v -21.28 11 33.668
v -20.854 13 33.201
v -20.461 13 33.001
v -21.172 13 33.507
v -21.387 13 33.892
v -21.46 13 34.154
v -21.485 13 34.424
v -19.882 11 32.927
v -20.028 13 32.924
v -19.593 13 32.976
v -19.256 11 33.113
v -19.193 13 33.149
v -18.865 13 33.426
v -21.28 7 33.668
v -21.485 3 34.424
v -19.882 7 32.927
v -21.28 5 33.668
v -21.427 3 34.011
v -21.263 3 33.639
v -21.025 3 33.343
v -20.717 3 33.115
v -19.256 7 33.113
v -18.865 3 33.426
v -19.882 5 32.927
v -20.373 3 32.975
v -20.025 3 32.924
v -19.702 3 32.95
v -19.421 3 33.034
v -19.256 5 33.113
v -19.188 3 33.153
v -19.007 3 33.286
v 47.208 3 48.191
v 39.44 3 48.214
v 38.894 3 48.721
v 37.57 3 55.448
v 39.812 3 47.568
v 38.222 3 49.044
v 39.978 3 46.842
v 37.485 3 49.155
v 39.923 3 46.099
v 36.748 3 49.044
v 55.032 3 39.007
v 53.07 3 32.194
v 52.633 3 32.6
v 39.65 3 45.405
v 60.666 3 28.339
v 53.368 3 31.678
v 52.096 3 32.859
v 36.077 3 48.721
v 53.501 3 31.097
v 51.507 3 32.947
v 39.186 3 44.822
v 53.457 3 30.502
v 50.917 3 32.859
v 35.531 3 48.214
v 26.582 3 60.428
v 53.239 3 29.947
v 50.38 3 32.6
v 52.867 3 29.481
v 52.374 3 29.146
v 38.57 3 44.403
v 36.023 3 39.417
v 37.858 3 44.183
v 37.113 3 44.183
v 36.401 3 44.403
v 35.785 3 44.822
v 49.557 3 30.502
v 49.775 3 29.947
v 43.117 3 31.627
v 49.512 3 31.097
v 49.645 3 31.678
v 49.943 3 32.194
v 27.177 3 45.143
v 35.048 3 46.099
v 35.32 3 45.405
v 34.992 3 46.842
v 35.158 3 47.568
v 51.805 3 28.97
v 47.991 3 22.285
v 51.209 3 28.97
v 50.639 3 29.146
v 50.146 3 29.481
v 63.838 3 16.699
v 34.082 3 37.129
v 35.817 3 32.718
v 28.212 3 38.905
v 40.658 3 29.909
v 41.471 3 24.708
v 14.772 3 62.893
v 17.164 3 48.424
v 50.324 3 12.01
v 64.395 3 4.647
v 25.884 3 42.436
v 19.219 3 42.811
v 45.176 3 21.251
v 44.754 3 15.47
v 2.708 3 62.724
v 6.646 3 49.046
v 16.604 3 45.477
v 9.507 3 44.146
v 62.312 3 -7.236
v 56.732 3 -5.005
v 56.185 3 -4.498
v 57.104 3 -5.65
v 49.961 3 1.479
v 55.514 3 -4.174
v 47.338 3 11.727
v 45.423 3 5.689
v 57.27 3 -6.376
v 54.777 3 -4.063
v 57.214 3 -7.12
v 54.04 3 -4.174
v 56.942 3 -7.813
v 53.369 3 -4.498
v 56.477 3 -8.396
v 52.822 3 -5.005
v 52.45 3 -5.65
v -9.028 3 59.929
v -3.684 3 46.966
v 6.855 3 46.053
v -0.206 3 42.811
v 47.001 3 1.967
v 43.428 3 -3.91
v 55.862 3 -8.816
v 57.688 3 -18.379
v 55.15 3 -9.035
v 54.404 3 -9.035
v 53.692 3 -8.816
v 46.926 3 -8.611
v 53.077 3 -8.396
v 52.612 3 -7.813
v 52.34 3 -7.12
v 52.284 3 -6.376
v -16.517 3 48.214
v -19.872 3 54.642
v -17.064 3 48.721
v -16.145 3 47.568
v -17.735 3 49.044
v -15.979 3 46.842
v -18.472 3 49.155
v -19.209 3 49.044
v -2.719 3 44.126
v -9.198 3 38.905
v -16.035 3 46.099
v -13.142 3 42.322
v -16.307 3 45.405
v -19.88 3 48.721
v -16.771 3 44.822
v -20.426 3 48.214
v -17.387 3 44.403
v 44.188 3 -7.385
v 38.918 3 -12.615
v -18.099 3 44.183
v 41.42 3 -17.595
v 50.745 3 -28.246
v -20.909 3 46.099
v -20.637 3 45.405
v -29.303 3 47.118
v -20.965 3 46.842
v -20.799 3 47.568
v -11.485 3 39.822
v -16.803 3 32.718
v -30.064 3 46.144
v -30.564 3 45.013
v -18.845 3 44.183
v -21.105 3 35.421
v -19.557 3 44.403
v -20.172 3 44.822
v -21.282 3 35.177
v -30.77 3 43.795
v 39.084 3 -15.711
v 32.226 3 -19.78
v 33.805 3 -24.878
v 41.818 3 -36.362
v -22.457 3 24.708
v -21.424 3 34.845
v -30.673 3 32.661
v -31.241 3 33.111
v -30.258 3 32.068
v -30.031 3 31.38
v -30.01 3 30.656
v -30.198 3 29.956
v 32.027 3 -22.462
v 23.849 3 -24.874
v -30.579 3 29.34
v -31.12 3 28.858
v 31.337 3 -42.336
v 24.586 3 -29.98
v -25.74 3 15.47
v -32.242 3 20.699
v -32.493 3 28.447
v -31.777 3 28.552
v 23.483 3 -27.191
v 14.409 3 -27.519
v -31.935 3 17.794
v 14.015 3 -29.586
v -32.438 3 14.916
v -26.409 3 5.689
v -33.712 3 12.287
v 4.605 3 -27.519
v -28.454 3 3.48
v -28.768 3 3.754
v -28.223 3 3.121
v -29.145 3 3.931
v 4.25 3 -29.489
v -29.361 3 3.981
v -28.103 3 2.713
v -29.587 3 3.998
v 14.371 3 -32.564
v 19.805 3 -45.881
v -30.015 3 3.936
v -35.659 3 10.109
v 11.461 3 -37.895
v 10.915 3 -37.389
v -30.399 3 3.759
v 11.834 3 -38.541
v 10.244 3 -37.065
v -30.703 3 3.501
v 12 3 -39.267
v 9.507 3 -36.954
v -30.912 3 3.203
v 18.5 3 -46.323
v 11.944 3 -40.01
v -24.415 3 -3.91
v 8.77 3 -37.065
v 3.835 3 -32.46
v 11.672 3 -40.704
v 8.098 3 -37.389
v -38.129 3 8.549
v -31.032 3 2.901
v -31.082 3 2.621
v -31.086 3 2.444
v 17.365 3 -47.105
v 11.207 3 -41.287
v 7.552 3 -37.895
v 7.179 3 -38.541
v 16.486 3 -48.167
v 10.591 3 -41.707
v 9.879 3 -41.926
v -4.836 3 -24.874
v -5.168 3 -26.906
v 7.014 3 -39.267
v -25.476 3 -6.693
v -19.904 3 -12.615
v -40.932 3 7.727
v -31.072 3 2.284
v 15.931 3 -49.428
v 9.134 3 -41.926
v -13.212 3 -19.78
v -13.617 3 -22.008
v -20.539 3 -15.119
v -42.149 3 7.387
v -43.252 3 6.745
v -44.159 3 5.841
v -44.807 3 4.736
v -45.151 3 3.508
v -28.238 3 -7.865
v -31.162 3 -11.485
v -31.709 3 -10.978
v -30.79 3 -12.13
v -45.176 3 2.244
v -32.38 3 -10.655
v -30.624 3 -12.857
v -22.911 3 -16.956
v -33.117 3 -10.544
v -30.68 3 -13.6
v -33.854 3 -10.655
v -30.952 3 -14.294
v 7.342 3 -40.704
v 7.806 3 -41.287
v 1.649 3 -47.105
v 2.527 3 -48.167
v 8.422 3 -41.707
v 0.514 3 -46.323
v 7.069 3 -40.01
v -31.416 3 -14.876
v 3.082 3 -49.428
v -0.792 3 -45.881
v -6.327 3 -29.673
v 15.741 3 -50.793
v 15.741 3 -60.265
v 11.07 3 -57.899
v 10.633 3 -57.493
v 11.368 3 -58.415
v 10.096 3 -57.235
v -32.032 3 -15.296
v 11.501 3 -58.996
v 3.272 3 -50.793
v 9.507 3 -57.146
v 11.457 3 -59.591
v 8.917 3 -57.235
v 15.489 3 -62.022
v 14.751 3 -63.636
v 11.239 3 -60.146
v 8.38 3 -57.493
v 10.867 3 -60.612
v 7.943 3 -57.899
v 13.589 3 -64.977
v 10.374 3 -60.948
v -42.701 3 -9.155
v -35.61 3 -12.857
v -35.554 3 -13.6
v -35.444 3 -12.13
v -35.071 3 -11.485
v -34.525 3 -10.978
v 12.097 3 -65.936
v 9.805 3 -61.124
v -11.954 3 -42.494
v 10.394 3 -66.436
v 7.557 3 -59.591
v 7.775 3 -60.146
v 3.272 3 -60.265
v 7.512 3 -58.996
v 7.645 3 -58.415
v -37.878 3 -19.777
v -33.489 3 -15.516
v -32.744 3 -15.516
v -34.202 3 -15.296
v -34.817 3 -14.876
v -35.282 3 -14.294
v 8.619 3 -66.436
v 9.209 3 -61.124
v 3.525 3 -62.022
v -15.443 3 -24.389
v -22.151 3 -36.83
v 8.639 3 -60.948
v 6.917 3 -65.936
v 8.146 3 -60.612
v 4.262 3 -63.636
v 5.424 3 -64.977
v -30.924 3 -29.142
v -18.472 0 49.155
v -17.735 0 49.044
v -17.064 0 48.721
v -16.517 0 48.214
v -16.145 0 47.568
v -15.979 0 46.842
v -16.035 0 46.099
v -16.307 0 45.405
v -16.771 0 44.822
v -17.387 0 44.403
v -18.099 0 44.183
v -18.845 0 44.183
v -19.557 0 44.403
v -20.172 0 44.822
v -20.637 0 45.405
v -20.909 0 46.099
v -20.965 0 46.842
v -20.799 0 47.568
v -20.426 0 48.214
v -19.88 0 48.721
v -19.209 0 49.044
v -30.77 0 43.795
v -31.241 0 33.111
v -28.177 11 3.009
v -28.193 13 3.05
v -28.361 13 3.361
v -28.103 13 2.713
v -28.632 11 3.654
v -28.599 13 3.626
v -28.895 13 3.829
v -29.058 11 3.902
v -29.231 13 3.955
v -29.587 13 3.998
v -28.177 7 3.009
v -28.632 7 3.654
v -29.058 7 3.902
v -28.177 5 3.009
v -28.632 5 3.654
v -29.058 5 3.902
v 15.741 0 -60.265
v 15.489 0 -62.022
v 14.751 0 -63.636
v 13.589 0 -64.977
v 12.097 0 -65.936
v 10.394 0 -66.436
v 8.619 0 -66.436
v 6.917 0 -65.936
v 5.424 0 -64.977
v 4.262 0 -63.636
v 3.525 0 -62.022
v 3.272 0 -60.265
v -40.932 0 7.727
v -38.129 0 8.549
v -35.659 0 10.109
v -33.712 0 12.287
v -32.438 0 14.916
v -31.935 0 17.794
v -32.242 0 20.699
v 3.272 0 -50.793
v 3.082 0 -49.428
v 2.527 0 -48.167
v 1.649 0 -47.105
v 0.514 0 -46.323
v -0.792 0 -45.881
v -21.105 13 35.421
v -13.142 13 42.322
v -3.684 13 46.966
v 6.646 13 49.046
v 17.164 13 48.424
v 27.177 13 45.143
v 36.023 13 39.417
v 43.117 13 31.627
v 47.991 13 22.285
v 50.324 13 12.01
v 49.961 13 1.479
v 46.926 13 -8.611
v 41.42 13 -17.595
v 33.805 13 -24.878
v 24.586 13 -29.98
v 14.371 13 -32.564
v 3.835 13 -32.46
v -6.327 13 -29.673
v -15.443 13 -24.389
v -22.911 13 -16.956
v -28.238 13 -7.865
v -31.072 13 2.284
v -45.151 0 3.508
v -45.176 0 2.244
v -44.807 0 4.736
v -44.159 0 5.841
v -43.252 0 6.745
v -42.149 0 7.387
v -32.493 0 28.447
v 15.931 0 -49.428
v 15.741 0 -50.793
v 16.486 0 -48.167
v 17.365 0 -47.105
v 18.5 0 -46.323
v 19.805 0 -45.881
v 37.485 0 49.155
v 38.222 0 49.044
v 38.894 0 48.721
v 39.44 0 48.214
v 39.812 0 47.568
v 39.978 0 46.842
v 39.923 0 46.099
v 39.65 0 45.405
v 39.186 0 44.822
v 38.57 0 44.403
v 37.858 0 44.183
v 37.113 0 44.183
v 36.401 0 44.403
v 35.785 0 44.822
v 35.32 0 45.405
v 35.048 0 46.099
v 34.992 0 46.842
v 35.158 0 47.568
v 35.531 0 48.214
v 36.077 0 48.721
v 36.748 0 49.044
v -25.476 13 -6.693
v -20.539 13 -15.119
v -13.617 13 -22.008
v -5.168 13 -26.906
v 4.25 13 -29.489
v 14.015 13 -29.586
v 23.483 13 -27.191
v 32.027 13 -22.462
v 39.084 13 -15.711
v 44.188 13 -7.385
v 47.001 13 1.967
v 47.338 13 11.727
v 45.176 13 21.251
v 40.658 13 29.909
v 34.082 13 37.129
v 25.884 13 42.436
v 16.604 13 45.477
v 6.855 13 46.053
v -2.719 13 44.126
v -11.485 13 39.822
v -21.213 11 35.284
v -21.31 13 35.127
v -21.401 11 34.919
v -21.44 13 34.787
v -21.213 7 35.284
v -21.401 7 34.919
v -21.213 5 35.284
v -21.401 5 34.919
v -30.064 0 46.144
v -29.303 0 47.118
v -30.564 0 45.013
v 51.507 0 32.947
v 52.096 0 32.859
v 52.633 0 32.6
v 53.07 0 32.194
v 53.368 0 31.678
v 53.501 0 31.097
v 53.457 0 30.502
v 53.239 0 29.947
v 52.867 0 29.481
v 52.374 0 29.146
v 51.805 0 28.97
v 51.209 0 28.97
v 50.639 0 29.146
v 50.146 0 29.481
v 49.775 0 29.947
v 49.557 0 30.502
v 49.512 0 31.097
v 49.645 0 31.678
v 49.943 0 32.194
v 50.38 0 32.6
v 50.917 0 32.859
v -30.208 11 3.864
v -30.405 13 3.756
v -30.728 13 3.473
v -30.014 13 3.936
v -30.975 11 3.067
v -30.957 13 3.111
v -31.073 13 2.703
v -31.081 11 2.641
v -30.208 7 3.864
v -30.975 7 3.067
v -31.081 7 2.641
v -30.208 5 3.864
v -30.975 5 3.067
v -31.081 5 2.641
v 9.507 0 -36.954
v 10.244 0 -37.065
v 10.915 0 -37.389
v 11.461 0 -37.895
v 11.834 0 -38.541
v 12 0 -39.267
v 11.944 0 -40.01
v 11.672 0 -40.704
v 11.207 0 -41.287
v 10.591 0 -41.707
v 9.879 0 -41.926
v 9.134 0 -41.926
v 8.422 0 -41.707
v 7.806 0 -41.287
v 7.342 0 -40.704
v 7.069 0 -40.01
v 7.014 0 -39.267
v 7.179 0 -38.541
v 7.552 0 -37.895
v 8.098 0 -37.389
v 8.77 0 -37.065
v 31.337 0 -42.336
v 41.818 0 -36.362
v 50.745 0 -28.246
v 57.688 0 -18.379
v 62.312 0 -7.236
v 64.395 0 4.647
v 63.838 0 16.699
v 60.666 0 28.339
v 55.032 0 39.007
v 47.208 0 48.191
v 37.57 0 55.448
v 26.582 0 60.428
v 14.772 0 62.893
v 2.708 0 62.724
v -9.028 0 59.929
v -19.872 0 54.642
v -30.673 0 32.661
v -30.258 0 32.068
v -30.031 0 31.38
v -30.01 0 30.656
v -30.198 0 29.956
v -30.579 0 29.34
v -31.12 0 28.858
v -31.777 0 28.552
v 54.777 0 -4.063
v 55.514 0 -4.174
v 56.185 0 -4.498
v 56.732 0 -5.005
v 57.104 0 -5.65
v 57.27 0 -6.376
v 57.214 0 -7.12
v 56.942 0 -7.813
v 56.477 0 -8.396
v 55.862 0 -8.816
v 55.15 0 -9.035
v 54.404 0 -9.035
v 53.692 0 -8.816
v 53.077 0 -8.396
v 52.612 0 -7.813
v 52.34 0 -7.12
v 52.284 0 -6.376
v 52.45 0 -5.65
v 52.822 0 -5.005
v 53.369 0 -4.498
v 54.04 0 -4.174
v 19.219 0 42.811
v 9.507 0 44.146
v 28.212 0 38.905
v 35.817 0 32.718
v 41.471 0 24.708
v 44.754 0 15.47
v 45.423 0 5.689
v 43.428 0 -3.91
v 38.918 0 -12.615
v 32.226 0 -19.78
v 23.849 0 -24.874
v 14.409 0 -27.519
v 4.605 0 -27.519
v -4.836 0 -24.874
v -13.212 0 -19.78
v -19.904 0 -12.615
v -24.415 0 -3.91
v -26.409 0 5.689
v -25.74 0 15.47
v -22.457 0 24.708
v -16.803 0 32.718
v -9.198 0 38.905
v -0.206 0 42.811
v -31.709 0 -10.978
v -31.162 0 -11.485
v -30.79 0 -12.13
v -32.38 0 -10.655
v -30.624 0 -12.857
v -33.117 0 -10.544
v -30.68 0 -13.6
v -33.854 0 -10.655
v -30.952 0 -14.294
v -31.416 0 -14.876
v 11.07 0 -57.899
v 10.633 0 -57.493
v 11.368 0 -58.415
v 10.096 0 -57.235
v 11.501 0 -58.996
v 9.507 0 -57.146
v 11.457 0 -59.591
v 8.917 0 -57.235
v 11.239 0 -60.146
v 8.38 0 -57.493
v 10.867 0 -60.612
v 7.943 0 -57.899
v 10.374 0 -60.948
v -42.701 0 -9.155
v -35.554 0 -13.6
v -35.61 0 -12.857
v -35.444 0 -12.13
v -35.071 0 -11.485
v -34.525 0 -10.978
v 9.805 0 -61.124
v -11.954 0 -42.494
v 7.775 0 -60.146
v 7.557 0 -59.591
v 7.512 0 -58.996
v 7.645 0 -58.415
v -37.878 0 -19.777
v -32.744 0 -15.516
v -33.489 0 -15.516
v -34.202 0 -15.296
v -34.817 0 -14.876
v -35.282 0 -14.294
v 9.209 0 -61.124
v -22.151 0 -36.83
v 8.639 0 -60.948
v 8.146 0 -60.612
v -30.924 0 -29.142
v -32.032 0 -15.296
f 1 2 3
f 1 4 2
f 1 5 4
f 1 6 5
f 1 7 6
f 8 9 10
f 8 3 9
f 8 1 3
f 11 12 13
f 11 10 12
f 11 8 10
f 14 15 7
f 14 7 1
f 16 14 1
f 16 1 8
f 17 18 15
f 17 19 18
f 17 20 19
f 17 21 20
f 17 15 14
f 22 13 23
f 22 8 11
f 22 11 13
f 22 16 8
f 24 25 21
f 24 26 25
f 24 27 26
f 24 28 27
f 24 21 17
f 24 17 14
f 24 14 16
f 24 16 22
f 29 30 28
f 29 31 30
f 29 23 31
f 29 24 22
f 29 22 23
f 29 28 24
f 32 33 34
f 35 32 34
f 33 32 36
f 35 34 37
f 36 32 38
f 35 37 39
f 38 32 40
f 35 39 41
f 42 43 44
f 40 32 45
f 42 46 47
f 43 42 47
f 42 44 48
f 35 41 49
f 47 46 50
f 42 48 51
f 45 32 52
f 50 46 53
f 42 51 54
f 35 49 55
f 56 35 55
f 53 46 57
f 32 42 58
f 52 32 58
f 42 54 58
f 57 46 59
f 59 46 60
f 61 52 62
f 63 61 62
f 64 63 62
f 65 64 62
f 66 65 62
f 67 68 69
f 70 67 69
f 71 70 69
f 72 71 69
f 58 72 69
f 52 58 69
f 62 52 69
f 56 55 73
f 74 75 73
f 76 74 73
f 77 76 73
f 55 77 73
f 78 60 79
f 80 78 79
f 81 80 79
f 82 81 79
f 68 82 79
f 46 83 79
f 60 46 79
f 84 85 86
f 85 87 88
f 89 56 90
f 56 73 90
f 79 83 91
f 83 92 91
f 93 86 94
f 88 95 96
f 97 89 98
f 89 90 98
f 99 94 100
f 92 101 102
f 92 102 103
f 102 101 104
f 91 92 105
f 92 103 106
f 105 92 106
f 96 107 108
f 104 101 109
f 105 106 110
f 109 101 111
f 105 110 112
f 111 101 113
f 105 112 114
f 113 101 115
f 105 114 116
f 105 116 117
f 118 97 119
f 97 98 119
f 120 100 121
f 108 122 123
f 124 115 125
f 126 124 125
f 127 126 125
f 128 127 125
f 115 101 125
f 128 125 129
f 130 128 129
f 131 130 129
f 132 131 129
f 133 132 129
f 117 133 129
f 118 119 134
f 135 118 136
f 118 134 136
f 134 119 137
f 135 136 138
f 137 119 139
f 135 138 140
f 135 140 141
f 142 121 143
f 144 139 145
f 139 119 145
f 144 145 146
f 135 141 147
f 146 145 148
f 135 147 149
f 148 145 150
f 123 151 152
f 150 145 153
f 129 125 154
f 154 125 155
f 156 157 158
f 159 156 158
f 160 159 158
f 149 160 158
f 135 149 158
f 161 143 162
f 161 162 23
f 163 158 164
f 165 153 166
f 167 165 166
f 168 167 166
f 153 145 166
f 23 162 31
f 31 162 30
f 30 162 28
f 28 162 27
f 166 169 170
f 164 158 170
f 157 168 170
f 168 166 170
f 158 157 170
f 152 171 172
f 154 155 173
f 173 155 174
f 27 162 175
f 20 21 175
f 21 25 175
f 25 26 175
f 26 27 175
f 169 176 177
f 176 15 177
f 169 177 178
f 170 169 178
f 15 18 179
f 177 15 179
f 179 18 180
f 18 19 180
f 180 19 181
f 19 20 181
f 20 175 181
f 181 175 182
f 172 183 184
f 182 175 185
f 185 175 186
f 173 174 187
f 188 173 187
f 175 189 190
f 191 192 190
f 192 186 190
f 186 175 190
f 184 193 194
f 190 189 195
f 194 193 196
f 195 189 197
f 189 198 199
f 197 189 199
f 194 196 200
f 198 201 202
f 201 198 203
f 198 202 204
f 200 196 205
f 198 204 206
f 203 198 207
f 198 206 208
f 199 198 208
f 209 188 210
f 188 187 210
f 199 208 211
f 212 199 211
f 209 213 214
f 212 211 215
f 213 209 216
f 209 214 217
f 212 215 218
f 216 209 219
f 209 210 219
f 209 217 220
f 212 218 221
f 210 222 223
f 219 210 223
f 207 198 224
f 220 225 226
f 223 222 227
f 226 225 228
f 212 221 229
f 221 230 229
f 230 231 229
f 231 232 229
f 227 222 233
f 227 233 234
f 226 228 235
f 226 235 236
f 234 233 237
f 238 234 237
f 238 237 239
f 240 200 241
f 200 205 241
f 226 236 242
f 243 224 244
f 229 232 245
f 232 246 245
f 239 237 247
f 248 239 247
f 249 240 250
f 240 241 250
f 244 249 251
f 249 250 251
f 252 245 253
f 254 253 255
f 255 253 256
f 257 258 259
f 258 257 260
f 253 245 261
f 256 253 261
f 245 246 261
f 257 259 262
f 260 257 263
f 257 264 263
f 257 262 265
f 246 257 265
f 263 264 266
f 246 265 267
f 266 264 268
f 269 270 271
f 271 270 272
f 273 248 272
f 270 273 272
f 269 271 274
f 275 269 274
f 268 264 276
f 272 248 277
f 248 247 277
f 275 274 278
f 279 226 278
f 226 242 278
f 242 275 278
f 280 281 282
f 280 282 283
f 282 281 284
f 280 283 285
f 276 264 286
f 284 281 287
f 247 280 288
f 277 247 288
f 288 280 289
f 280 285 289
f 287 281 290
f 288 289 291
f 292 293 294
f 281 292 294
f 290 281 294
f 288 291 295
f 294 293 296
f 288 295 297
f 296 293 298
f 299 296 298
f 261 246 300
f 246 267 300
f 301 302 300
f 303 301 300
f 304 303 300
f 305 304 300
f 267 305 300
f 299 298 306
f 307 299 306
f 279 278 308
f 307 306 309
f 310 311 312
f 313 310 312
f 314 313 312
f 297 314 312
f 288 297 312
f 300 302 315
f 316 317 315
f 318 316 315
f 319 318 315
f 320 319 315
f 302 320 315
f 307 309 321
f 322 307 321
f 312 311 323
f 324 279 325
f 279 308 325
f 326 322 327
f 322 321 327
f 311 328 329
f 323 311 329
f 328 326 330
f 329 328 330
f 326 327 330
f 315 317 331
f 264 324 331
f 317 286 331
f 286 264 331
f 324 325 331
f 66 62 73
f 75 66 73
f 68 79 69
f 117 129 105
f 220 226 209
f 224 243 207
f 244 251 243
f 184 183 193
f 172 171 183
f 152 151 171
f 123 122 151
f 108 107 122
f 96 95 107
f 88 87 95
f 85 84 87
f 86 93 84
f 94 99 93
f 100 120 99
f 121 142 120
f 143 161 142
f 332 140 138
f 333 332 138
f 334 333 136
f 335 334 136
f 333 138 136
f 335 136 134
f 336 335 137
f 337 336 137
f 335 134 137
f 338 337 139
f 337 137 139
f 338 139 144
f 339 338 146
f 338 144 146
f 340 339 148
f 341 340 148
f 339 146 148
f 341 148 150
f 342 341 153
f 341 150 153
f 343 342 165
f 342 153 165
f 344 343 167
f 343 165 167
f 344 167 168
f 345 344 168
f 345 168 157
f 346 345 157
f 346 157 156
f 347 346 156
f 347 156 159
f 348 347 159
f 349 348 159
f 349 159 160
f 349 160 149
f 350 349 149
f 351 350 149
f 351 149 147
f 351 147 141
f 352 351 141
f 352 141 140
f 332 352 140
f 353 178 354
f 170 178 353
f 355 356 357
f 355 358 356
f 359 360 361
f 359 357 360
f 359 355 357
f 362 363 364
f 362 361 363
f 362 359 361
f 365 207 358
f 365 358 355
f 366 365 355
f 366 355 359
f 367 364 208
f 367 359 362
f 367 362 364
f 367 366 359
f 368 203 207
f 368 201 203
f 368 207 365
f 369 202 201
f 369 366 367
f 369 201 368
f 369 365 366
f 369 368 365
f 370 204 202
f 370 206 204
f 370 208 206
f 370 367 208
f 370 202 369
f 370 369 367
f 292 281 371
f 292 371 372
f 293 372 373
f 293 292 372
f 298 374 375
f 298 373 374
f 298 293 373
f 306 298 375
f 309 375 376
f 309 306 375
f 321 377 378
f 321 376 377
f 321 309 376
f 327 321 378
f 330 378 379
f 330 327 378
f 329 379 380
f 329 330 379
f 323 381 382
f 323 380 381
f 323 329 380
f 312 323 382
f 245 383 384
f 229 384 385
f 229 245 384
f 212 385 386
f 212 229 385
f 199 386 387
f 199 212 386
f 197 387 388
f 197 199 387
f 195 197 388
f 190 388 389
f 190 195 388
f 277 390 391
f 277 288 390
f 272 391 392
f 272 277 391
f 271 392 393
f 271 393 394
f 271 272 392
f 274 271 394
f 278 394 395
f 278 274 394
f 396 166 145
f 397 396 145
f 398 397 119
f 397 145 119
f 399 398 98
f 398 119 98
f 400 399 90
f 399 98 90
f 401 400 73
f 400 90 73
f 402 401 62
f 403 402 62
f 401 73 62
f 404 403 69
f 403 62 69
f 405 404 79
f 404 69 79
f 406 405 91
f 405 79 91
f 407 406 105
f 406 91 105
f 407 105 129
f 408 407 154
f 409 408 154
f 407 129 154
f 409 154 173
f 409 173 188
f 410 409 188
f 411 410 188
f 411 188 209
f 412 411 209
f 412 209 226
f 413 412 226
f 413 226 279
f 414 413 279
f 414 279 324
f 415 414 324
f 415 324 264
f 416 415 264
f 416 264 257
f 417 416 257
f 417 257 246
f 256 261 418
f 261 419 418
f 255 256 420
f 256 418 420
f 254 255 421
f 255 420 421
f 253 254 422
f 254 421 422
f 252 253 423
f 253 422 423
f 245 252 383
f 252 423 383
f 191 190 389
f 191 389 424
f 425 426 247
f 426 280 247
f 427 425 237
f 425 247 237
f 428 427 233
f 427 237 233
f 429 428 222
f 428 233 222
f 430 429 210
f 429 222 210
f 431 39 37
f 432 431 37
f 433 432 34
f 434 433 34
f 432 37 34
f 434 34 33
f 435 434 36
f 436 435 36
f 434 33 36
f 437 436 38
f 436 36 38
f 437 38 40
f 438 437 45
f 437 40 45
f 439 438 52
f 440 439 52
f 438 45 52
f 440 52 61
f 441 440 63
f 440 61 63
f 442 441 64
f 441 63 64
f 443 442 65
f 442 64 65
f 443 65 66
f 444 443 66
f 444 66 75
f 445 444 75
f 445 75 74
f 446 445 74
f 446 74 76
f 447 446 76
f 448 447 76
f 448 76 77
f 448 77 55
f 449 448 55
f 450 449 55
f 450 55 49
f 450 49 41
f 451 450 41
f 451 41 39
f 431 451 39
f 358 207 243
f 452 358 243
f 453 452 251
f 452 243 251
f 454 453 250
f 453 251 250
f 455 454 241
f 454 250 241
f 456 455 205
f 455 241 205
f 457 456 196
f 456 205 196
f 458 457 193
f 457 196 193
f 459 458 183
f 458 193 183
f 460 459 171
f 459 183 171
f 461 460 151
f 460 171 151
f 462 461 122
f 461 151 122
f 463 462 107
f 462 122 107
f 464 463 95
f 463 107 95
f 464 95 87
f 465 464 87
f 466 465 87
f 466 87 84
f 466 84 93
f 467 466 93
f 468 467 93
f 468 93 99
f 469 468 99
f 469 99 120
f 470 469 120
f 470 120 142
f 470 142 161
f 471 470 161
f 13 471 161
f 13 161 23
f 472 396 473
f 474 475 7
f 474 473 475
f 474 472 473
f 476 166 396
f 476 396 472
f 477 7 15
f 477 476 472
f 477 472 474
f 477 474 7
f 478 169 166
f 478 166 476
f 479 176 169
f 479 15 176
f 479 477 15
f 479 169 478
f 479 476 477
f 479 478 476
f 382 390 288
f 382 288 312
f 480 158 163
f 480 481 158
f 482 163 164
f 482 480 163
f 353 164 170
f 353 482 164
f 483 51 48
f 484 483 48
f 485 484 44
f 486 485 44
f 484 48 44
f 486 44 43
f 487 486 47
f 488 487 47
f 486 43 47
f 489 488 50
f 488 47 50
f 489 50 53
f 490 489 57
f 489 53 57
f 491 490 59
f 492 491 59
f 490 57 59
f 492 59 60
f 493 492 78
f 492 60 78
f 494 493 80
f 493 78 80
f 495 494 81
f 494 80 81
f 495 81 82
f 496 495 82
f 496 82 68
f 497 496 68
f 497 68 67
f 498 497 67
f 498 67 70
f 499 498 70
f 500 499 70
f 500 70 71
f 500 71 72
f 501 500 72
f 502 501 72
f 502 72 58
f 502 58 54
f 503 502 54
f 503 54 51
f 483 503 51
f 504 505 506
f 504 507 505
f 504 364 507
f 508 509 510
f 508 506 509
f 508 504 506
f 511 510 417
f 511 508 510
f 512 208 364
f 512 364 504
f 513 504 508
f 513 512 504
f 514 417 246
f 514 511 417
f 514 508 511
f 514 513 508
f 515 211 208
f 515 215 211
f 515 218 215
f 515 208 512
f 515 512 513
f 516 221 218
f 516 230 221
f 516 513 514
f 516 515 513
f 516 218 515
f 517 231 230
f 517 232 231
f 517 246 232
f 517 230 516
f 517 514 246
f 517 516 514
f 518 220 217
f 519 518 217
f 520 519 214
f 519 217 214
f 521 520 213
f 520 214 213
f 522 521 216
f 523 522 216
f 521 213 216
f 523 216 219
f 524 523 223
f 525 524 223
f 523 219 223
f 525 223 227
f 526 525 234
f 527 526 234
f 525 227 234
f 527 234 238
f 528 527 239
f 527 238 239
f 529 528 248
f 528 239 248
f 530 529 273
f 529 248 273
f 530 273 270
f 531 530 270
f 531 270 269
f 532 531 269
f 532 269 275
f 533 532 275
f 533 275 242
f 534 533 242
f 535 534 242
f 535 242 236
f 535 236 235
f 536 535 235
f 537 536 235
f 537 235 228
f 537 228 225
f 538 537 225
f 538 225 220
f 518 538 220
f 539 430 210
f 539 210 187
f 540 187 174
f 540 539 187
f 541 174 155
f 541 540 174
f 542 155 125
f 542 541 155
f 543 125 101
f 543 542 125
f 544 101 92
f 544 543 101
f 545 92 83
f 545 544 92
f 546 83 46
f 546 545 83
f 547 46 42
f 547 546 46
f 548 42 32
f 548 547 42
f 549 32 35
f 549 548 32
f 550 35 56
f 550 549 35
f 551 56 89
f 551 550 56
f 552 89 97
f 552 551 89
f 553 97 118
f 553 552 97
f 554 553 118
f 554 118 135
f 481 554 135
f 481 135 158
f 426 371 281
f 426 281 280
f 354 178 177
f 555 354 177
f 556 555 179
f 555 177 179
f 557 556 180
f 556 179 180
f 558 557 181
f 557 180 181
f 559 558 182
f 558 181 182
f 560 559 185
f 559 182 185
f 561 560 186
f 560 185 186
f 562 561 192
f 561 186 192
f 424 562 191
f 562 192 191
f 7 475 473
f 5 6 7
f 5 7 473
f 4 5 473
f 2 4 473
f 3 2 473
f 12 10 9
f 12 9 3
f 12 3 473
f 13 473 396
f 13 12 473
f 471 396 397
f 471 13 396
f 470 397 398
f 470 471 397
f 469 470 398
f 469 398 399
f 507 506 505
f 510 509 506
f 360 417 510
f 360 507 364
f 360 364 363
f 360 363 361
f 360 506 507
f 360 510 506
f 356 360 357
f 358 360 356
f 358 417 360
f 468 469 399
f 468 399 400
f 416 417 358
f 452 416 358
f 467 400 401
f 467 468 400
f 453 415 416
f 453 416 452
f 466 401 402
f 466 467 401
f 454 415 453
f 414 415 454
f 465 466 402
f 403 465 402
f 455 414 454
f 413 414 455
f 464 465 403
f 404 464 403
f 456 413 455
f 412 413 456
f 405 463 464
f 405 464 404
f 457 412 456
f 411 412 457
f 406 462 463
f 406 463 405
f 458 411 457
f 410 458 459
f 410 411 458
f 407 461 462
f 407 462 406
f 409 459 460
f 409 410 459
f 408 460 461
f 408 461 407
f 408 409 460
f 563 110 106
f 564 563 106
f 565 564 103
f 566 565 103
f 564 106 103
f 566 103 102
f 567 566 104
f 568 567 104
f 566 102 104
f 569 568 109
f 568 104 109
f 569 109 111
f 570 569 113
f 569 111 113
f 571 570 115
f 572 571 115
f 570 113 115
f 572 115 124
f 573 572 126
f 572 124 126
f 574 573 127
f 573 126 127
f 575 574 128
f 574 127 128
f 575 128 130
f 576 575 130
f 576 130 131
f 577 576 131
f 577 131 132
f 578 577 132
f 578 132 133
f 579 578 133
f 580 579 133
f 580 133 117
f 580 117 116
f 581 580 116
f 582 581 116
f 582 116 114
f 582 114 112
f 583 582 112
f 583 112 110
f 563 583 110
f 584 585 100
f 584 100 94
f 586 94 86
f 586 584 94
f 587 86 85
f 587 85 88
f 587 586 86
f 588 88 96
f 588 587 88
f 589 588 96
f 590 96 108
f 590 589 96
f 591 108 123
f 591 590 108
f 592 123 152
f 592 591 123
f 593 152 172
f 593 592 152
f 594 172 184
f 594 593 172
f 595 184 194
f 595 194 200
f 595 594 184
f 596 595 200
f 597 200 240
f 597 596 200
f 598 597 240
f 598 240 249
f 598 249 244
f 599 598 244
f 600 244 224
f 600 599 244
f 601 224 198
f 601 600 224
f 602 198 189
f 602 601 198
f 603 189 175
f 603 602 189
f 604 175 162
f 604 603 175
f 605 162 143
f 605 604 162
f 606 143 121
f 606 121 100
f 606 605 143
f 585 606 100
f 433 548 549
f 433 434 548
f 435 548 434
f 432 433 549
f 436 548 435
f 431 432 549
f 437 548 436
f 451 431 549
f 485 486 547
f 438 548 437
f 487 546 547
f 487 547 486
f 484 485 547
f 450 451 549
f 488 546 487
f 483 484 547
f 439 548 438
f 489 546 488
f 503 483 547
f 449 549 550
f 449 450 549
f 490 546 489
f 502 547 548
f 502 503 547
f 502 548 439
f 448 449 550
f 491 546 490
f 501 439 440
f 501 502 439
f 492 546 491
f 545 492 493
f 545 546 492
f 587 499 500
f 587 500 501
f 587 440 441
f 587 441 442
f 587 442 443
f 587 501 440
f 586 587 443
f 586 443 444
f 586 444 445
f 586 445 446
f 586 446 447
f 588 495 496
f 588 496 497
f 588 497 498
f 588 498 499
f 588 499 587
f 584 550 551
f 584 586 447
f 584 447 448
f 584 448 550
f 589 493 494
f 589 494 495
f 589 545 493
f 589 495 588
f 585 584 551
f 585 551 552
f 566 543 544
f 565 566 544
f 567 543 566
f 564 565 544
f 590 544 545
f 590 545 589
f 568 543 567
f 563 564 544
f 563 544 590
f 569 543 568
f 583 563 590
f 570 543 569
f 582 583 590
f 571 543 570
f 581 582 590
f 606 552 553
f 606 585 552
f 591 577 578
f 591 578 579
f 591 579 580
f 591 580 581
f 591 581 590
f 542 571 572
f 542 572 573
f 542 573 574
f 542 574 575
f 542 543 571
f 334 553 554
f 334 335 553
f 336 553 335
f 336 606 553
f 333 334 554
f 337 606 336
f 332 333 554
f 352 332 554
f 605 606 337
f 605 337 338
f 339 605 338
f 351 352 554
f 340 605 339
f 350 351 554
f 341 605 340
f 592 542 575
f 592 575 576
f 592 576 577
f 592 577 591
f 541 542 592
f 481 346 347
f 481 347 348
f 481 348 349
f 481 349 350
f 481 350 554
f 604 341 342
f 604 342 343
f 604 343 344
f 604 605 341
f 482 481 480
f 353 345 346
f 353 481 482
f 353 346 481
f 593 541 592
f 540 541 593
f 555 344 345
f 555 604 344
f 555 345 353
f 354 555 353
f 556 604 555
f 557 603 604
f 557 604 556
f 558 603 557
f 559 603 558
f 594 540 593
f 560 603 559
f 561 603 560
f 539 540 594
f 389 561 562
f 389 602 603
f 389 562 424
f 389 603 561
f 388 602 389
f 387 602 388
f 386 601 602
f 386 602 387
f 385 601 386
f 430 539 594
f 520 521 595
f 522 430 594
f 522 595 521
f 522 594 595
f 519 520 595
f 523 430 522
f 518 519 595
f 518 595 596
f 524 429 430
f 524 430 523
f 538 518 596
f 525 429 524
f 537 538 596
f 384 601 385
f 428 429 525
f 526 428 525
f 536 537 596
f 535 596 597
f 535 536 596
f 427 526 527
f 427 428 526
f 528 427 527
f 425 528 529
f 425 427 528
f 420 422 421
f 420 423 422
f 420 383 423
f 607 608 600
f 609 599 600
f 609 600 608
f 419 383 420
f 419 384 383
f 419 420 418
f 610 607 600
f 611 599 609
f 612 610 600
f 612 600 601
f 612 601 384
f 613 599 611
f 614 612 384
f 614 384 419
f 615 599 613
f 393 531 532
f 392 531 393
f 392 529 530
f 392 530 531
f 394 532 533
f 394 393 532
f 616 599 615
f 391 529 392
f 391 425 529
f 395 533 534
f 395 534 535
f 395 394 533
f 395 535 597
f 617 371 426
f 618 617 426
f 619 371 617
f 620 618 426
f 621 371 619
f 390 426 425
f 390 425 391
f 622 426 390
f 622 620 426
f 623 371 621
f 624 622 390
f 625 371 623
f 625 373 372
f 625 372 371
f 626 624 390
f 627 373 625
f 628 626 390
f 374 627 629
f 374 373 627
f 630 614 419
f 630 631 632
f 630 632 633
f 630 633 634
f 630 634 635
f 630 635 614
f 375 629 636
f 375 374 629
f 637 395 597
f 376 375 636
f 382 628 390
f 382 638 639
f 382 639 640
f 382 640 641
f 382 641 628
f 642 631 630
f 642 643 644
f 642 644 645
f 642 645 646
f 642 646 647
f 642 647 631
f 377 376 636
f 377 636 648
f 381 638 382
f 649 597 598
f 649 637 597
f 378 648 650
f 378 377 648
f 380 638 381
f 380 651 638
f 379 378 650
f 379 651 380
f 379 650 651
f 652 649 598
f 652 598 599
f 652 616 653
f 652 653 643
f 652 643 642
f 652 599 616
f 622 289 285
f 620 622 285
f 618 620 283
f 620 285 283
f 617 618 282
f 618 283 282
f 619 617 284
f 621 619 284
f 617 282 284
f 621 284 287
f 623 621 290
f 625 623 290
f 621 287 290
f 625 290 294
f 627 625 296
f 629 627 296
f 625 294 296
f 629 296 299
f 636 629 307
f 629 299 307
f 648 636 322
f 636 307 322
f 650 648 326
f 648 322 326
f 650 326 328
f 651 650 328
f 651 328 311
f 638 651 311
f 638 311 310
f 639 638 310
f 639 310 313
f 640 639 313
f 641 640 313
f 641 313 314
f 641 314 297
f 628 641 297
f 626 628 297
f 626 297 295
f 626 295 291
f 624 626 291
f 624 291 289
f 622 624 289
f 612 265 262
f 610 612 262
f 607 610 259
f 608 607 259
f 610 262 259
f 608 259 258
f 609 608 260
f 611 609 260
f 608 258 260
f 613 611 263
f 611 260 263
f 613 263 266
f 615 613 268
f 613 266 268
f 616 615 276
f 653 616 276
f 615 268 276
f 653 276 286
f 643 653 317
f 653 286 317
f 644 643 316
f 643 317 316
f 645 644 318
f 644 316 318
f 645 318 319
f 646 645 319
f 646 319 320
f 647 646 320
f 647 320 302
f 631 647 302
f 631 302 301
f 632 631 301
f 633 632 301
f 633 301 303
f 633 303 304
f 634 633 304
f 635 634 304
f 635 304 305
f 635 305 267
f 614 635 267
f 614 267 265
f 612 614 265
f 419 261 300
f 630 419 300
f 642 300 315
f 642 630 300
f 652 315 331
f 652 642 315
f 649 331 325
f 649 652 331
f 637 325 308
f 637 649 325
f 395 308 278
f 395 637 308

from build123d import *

# Parameters (mm, degrees)
SKETCH4_R           = 36
BOSS_EXTRUDE1_DEPTH = 3
SKETCH5_R           = 2
SKETCH5_R_2         = 2.5
CUT_EXTRUDE1_DEPTH  = 93.694705096
CUT_EXTRUDE2_DEPTH  = 93.694705096
FILLET1_R           = 5
FILLET2_RADIUS      = 6.234464512
FILLET2_LENGTH      = 3
BOSS_EXTRUDE2_DEPTH = 10
FILLET4_START       = 3
FILLET4_DEPTH       = 11
FILLET5_START       = 3
FILLET5_DEPTH       = 11


with BuildPart() as part:
    # Sketch4 → Boss-Extrude1 (new body)
    with BuildSketch(Plane(origin=(0, 0, 0), x_dir=(1, 0, 0), z_dir=(0, 1, 0))):
        with BuildLine():
            Line((3.272204442, 66.499609121), (15.741133466, 66.499609121))
            Line((15.741133466, 66.499609121), (15.741133466, 46.499609121))
            ThreePointArc((15.741133466, 46.499609121), (9.506668954, -63.145898034), (3.272204442, 46.499609121))
            Line((3.272204442, 46.499609121), (3.272204442, 66.499609121))
        make_face()
        with Locations(Location((9.506668954, -8.145898034, 0), (0, 0, 270))):
            Circle(SKETCH4_R, mode=Mode.SUBTRACT)
    extrude(amount=BOSS_EXTRUDE1_DEPTH)

    # Sketch5 → Cut-Extrude1 (cut, through all)
    with BuildSketch(Plane(origin=(0, 3, 0), x_dir=(1, 0, 0), z_dir=(0, 1, 0))):
        with Locations(Location((9.506668954, 59.145898034, 0), (0, 0, 270))):
            Circle(SKETCH5_R)
        with Locations(Location((9.506668954, 39.454101966, 0), (0, 0, 270))):
            Circle(SKETCH5_R_2)
        with Locations(Location((54.77695913, 6.563310898, 0), (0, 0, 270))):
            Circle(SKETCH5_R_2)
        with Locations(Location((51.506668954, -30.947448364, 0), (0, 0, 270))):
            Circle(SKETCH5_R)
        with Locations(Location((37.485246963, -46.655106966, 0), (0, 0, 270))):
            Circle(SKETCH5_R_2)
        with Locations(Location((-18.471909055, -46.655106966, 0), (0, 0, 270))):
            Circle(SKETCH5_R_2)
        with Locations(Location((-32.493331046, -30.947448364, 0), (0, 0, 270))):
            Circle(SKETCH5_R_2)
        with Locations(Location((-33.116843335, 13.043632404, 0), (0, 0, 270))):
            Circle(SKETCH5_R_2)
    extrude(amount=-CUT_EXTRUDE1_DEPTH, mode=Mode.SUBTRACT)

    # Sketch6 → Cut-Extrude2 (cut, through all)
    with BuildSketch(Plane(origin=(0, 3, 0), x_dir=(1, 0, 0), z_dir=(0, 1, 0))):
        with BuildLine():
            Line((-31.240982332, -33.111154143), (-30.281144407, -54.888863669))
            Line((-30.281144407, -54.888863669), (-55.634525549, -56.00629692))
            Line((-55.634525549, -56.00629692), (-56.656818195, -8.246358342))
            Line((-56.656818195, -8.246358342), (-42.942031477, -7.625931476))
            ThreePointArc((-42.942031477, -7.625931476), (-34.312049589, -11.478197503), (-32.241689114, -20.699376843))
            Line((-32.241689114, -20.699376843), (-32.493331046, -28.447448364))
            ThreePointArc((-32.493331046, -28.447448364), (-30.078867912, -30.299090611), (-31.240982332, -33.111154143))
        make_face()
    extrude(amount=-CUT_EXTRUDE2_DEPTH, mode=Mode.SUBTRACT)

    # Fillet1
    fillet1_edges = [part.edges().sort_by_distance(p)[0] for p in [
        (3.272204442, 1.5, -46.499609121),
        (15.741133466, 1.5, -46.499609121),
        (-30.686613079, 1.5, 45.689207416),
        (-45.491842696, 1.5, 7.741279342),
    ]]
    fillet(fillet1_edges, radius=FILLET1_R)

    # Fillet2: full round fillet: the end face becomes a half cylinder, R = half its width
    fillet2_face = Plane((9.506668954, 1.5, -66.499609121), x_dir=(0, 1, 0), z_dir=(0, 0, -1))  # on the end face: x along it, z out of the body
    fillet2_slab = fillet2_face.offset(-FILLET2_RADIUS / 2) * Box(FILLET2_LENGTH, 2 * FILLET2_RADIUS, FILLET2_RADIUS, mode=Mode.PRIVATE)  # the body's end, R deep
    fillet2_round = Plane((9.506668954, 1.5, -60.265144609), x_dir=(0, 0, -1), z_dir=(0, 1, 0)) * Cylinder(FILLET2_RADIUS, FILLET2_LENGTH, mode=Mode.PRIVATE)  # its axis R under the face
    add(fillet2_slab - fillet2_round, mode=Mode.SUBTRACT)

    # Sketch9 → Boss-Extrude2 (add)
    with BuildSketch(Plane(origin=(0, 3, 0), x_dir=(1, 0, 0), z_dir=(0, 1, 0))):
        with BuildLine():
            Line((-31.282982054, -3.998082872), (-28.266279427, -3.998082872))
            ThreePointArc((-28.266279427, -3.998082872), (46.288733159, 1.397673249), (-21.484606715, -30.135459931))
            Line((-21.484606715, -30.135459931), (-21.484606715, -34.988789689))
            ThreePointArc((-21.484606715, -34.988789689), (48.599268457, 4.214064106), (-31.282982054, -3.998082872))
        make_face()
    extrude(amount=BOSS_EXTRUDE2_DEPTH)

    # Fillet4: read off the stored shape, not the designer's step
    # Fillet4 outline → Fillet4 (cut)
    with BuildSketch(Plane(origin=(0, 0, 0), x_dir=(1, 0, 0), z_dir=(0, 1, 0)).offset(FILLET4_START)):
        with BuildLine():
            ThreePointArc((-21.484606715, -34.988789689), (-21.295327251, -35.205776633), (-21.104528575, -35.421428933))
            add(Edge.make_bspline(
                [(-21.104528575, -35.421428933), (-21.228279098, -35.282544315), (-21.3411007, -35.112745613), (-21.431423393, -34.910535387), (-21.484606706, -34.678162347), (-21.484606715, -34.423543707)],
                knots=[0, 0, 0, 0, 0, 0, 0.275825991, 0.275825991, 0.275825991, 0.275825991, 0.275825991, 0.275825991], degree=5, weights=[1, 0.889669603, 0.794555202, 0.714656797, 0.649974387, 0.600507972]))
            Line((-21.484606715, -34.423543707), (-21.484606715, -34.988789689))
        make_face()
        with BuildLine():
            Line((-21.484606715, -30.135459931), (-21.484606715, -34.423543707))
            add(Edge.make_bspline(
                [(-21.484606715, -34.423543707), (-21.484606746, -33.500313944), (-20.896716335, -32.737133887), (-19.98906503, -32.613765882), (-19.271618069, -32.968959182), (-18.864684854, -33.425658379)],
                knots=[0.275825991, 0.275825991, 0.275825991, 0.275825991, 0.275825991, 0.275825991, 1, 1, 1, 1, 1, 1], degree=5, weights=[0.600507972, 0.47063518, 0.445647986, 0.525546392, 0.710330397, 1]))
            ThreePointArc((-18.864684854, -33.425658379), (-20.22020098, -31.816833883), (-21.484606715, -30.135459931))
        make_face()
    extrude(amount=FILLET4_DEPTH, mode=Mode.SUBTRACT)

    # Fillet5: read off the stored shape, not the designer's step
    # Fillet5 outline → Fillet5 (cut)
    with BuildSketch(Plane(origin=(0, 0, 0), x_dir=(1, 0, 0), z_dir=(0, 1, 0)).offset(FILLET5_START)):
        with BuildLine():
            ThreePointArc((-28.266279427, -3.998082872), (-28.19006415, -3.354623327), (-28.102888392, -2.712556866))
            add(Edge.make_bspline(
                [(-28.102888392, -2.712556866), (-28.151775573, -3.050953664), (-28.302840716, -3.42403045), (-28.598328595, -3.773471224), (-29.047777864, -3.998082872), (-29.587476182, -3.998082872)],
                knots=[0, 0, 0, 0, 0, 0, 0.464069746, 0.464069746, 0.464069746, 0.464069746, 0.464069746, 0.464069746], degree=5, weights=[1, 0.814372102, 0.671816349, 0.572332742, 0.515921281, 0.502581966]))
            Line((-29.587476182, -3.998082872), (-28.266279427, -3.998082872))
        make_face()
        with BuildLine():
            Line((-31.282982054, -3.998082872), (-29.587476182, -3.998082872))
            add(Edge.make_bspline(
                [(-29.587476182, -3.998082872), (-30.247519863, -3.998082872), (-30.77941952, -3.674118257), (-31.063082194, -3.179978591), (-31.130586894, -2.688704223), (-31.072063972, -2.283608879)],
                knots=[0.464069746, 0.464069746, 0.464069746, 0.464069746, 0.464069746, 0.464069746, 1, 1, 1, 1, 1, 1], degree=5, weights=[0.502581966, 0.487177078, 0.529216438, 0.628700044, 0.785627898, 1]))
            ThreePointArc((-31.072063972, -2.283608879), (-31.186553224, -3.13973496), (-31.282982054, -3.998082872))
        make_face()
    extrude(amount=FILLET5_DEPTH, mode=Mode.SUBTRACT)


solid = part.part
